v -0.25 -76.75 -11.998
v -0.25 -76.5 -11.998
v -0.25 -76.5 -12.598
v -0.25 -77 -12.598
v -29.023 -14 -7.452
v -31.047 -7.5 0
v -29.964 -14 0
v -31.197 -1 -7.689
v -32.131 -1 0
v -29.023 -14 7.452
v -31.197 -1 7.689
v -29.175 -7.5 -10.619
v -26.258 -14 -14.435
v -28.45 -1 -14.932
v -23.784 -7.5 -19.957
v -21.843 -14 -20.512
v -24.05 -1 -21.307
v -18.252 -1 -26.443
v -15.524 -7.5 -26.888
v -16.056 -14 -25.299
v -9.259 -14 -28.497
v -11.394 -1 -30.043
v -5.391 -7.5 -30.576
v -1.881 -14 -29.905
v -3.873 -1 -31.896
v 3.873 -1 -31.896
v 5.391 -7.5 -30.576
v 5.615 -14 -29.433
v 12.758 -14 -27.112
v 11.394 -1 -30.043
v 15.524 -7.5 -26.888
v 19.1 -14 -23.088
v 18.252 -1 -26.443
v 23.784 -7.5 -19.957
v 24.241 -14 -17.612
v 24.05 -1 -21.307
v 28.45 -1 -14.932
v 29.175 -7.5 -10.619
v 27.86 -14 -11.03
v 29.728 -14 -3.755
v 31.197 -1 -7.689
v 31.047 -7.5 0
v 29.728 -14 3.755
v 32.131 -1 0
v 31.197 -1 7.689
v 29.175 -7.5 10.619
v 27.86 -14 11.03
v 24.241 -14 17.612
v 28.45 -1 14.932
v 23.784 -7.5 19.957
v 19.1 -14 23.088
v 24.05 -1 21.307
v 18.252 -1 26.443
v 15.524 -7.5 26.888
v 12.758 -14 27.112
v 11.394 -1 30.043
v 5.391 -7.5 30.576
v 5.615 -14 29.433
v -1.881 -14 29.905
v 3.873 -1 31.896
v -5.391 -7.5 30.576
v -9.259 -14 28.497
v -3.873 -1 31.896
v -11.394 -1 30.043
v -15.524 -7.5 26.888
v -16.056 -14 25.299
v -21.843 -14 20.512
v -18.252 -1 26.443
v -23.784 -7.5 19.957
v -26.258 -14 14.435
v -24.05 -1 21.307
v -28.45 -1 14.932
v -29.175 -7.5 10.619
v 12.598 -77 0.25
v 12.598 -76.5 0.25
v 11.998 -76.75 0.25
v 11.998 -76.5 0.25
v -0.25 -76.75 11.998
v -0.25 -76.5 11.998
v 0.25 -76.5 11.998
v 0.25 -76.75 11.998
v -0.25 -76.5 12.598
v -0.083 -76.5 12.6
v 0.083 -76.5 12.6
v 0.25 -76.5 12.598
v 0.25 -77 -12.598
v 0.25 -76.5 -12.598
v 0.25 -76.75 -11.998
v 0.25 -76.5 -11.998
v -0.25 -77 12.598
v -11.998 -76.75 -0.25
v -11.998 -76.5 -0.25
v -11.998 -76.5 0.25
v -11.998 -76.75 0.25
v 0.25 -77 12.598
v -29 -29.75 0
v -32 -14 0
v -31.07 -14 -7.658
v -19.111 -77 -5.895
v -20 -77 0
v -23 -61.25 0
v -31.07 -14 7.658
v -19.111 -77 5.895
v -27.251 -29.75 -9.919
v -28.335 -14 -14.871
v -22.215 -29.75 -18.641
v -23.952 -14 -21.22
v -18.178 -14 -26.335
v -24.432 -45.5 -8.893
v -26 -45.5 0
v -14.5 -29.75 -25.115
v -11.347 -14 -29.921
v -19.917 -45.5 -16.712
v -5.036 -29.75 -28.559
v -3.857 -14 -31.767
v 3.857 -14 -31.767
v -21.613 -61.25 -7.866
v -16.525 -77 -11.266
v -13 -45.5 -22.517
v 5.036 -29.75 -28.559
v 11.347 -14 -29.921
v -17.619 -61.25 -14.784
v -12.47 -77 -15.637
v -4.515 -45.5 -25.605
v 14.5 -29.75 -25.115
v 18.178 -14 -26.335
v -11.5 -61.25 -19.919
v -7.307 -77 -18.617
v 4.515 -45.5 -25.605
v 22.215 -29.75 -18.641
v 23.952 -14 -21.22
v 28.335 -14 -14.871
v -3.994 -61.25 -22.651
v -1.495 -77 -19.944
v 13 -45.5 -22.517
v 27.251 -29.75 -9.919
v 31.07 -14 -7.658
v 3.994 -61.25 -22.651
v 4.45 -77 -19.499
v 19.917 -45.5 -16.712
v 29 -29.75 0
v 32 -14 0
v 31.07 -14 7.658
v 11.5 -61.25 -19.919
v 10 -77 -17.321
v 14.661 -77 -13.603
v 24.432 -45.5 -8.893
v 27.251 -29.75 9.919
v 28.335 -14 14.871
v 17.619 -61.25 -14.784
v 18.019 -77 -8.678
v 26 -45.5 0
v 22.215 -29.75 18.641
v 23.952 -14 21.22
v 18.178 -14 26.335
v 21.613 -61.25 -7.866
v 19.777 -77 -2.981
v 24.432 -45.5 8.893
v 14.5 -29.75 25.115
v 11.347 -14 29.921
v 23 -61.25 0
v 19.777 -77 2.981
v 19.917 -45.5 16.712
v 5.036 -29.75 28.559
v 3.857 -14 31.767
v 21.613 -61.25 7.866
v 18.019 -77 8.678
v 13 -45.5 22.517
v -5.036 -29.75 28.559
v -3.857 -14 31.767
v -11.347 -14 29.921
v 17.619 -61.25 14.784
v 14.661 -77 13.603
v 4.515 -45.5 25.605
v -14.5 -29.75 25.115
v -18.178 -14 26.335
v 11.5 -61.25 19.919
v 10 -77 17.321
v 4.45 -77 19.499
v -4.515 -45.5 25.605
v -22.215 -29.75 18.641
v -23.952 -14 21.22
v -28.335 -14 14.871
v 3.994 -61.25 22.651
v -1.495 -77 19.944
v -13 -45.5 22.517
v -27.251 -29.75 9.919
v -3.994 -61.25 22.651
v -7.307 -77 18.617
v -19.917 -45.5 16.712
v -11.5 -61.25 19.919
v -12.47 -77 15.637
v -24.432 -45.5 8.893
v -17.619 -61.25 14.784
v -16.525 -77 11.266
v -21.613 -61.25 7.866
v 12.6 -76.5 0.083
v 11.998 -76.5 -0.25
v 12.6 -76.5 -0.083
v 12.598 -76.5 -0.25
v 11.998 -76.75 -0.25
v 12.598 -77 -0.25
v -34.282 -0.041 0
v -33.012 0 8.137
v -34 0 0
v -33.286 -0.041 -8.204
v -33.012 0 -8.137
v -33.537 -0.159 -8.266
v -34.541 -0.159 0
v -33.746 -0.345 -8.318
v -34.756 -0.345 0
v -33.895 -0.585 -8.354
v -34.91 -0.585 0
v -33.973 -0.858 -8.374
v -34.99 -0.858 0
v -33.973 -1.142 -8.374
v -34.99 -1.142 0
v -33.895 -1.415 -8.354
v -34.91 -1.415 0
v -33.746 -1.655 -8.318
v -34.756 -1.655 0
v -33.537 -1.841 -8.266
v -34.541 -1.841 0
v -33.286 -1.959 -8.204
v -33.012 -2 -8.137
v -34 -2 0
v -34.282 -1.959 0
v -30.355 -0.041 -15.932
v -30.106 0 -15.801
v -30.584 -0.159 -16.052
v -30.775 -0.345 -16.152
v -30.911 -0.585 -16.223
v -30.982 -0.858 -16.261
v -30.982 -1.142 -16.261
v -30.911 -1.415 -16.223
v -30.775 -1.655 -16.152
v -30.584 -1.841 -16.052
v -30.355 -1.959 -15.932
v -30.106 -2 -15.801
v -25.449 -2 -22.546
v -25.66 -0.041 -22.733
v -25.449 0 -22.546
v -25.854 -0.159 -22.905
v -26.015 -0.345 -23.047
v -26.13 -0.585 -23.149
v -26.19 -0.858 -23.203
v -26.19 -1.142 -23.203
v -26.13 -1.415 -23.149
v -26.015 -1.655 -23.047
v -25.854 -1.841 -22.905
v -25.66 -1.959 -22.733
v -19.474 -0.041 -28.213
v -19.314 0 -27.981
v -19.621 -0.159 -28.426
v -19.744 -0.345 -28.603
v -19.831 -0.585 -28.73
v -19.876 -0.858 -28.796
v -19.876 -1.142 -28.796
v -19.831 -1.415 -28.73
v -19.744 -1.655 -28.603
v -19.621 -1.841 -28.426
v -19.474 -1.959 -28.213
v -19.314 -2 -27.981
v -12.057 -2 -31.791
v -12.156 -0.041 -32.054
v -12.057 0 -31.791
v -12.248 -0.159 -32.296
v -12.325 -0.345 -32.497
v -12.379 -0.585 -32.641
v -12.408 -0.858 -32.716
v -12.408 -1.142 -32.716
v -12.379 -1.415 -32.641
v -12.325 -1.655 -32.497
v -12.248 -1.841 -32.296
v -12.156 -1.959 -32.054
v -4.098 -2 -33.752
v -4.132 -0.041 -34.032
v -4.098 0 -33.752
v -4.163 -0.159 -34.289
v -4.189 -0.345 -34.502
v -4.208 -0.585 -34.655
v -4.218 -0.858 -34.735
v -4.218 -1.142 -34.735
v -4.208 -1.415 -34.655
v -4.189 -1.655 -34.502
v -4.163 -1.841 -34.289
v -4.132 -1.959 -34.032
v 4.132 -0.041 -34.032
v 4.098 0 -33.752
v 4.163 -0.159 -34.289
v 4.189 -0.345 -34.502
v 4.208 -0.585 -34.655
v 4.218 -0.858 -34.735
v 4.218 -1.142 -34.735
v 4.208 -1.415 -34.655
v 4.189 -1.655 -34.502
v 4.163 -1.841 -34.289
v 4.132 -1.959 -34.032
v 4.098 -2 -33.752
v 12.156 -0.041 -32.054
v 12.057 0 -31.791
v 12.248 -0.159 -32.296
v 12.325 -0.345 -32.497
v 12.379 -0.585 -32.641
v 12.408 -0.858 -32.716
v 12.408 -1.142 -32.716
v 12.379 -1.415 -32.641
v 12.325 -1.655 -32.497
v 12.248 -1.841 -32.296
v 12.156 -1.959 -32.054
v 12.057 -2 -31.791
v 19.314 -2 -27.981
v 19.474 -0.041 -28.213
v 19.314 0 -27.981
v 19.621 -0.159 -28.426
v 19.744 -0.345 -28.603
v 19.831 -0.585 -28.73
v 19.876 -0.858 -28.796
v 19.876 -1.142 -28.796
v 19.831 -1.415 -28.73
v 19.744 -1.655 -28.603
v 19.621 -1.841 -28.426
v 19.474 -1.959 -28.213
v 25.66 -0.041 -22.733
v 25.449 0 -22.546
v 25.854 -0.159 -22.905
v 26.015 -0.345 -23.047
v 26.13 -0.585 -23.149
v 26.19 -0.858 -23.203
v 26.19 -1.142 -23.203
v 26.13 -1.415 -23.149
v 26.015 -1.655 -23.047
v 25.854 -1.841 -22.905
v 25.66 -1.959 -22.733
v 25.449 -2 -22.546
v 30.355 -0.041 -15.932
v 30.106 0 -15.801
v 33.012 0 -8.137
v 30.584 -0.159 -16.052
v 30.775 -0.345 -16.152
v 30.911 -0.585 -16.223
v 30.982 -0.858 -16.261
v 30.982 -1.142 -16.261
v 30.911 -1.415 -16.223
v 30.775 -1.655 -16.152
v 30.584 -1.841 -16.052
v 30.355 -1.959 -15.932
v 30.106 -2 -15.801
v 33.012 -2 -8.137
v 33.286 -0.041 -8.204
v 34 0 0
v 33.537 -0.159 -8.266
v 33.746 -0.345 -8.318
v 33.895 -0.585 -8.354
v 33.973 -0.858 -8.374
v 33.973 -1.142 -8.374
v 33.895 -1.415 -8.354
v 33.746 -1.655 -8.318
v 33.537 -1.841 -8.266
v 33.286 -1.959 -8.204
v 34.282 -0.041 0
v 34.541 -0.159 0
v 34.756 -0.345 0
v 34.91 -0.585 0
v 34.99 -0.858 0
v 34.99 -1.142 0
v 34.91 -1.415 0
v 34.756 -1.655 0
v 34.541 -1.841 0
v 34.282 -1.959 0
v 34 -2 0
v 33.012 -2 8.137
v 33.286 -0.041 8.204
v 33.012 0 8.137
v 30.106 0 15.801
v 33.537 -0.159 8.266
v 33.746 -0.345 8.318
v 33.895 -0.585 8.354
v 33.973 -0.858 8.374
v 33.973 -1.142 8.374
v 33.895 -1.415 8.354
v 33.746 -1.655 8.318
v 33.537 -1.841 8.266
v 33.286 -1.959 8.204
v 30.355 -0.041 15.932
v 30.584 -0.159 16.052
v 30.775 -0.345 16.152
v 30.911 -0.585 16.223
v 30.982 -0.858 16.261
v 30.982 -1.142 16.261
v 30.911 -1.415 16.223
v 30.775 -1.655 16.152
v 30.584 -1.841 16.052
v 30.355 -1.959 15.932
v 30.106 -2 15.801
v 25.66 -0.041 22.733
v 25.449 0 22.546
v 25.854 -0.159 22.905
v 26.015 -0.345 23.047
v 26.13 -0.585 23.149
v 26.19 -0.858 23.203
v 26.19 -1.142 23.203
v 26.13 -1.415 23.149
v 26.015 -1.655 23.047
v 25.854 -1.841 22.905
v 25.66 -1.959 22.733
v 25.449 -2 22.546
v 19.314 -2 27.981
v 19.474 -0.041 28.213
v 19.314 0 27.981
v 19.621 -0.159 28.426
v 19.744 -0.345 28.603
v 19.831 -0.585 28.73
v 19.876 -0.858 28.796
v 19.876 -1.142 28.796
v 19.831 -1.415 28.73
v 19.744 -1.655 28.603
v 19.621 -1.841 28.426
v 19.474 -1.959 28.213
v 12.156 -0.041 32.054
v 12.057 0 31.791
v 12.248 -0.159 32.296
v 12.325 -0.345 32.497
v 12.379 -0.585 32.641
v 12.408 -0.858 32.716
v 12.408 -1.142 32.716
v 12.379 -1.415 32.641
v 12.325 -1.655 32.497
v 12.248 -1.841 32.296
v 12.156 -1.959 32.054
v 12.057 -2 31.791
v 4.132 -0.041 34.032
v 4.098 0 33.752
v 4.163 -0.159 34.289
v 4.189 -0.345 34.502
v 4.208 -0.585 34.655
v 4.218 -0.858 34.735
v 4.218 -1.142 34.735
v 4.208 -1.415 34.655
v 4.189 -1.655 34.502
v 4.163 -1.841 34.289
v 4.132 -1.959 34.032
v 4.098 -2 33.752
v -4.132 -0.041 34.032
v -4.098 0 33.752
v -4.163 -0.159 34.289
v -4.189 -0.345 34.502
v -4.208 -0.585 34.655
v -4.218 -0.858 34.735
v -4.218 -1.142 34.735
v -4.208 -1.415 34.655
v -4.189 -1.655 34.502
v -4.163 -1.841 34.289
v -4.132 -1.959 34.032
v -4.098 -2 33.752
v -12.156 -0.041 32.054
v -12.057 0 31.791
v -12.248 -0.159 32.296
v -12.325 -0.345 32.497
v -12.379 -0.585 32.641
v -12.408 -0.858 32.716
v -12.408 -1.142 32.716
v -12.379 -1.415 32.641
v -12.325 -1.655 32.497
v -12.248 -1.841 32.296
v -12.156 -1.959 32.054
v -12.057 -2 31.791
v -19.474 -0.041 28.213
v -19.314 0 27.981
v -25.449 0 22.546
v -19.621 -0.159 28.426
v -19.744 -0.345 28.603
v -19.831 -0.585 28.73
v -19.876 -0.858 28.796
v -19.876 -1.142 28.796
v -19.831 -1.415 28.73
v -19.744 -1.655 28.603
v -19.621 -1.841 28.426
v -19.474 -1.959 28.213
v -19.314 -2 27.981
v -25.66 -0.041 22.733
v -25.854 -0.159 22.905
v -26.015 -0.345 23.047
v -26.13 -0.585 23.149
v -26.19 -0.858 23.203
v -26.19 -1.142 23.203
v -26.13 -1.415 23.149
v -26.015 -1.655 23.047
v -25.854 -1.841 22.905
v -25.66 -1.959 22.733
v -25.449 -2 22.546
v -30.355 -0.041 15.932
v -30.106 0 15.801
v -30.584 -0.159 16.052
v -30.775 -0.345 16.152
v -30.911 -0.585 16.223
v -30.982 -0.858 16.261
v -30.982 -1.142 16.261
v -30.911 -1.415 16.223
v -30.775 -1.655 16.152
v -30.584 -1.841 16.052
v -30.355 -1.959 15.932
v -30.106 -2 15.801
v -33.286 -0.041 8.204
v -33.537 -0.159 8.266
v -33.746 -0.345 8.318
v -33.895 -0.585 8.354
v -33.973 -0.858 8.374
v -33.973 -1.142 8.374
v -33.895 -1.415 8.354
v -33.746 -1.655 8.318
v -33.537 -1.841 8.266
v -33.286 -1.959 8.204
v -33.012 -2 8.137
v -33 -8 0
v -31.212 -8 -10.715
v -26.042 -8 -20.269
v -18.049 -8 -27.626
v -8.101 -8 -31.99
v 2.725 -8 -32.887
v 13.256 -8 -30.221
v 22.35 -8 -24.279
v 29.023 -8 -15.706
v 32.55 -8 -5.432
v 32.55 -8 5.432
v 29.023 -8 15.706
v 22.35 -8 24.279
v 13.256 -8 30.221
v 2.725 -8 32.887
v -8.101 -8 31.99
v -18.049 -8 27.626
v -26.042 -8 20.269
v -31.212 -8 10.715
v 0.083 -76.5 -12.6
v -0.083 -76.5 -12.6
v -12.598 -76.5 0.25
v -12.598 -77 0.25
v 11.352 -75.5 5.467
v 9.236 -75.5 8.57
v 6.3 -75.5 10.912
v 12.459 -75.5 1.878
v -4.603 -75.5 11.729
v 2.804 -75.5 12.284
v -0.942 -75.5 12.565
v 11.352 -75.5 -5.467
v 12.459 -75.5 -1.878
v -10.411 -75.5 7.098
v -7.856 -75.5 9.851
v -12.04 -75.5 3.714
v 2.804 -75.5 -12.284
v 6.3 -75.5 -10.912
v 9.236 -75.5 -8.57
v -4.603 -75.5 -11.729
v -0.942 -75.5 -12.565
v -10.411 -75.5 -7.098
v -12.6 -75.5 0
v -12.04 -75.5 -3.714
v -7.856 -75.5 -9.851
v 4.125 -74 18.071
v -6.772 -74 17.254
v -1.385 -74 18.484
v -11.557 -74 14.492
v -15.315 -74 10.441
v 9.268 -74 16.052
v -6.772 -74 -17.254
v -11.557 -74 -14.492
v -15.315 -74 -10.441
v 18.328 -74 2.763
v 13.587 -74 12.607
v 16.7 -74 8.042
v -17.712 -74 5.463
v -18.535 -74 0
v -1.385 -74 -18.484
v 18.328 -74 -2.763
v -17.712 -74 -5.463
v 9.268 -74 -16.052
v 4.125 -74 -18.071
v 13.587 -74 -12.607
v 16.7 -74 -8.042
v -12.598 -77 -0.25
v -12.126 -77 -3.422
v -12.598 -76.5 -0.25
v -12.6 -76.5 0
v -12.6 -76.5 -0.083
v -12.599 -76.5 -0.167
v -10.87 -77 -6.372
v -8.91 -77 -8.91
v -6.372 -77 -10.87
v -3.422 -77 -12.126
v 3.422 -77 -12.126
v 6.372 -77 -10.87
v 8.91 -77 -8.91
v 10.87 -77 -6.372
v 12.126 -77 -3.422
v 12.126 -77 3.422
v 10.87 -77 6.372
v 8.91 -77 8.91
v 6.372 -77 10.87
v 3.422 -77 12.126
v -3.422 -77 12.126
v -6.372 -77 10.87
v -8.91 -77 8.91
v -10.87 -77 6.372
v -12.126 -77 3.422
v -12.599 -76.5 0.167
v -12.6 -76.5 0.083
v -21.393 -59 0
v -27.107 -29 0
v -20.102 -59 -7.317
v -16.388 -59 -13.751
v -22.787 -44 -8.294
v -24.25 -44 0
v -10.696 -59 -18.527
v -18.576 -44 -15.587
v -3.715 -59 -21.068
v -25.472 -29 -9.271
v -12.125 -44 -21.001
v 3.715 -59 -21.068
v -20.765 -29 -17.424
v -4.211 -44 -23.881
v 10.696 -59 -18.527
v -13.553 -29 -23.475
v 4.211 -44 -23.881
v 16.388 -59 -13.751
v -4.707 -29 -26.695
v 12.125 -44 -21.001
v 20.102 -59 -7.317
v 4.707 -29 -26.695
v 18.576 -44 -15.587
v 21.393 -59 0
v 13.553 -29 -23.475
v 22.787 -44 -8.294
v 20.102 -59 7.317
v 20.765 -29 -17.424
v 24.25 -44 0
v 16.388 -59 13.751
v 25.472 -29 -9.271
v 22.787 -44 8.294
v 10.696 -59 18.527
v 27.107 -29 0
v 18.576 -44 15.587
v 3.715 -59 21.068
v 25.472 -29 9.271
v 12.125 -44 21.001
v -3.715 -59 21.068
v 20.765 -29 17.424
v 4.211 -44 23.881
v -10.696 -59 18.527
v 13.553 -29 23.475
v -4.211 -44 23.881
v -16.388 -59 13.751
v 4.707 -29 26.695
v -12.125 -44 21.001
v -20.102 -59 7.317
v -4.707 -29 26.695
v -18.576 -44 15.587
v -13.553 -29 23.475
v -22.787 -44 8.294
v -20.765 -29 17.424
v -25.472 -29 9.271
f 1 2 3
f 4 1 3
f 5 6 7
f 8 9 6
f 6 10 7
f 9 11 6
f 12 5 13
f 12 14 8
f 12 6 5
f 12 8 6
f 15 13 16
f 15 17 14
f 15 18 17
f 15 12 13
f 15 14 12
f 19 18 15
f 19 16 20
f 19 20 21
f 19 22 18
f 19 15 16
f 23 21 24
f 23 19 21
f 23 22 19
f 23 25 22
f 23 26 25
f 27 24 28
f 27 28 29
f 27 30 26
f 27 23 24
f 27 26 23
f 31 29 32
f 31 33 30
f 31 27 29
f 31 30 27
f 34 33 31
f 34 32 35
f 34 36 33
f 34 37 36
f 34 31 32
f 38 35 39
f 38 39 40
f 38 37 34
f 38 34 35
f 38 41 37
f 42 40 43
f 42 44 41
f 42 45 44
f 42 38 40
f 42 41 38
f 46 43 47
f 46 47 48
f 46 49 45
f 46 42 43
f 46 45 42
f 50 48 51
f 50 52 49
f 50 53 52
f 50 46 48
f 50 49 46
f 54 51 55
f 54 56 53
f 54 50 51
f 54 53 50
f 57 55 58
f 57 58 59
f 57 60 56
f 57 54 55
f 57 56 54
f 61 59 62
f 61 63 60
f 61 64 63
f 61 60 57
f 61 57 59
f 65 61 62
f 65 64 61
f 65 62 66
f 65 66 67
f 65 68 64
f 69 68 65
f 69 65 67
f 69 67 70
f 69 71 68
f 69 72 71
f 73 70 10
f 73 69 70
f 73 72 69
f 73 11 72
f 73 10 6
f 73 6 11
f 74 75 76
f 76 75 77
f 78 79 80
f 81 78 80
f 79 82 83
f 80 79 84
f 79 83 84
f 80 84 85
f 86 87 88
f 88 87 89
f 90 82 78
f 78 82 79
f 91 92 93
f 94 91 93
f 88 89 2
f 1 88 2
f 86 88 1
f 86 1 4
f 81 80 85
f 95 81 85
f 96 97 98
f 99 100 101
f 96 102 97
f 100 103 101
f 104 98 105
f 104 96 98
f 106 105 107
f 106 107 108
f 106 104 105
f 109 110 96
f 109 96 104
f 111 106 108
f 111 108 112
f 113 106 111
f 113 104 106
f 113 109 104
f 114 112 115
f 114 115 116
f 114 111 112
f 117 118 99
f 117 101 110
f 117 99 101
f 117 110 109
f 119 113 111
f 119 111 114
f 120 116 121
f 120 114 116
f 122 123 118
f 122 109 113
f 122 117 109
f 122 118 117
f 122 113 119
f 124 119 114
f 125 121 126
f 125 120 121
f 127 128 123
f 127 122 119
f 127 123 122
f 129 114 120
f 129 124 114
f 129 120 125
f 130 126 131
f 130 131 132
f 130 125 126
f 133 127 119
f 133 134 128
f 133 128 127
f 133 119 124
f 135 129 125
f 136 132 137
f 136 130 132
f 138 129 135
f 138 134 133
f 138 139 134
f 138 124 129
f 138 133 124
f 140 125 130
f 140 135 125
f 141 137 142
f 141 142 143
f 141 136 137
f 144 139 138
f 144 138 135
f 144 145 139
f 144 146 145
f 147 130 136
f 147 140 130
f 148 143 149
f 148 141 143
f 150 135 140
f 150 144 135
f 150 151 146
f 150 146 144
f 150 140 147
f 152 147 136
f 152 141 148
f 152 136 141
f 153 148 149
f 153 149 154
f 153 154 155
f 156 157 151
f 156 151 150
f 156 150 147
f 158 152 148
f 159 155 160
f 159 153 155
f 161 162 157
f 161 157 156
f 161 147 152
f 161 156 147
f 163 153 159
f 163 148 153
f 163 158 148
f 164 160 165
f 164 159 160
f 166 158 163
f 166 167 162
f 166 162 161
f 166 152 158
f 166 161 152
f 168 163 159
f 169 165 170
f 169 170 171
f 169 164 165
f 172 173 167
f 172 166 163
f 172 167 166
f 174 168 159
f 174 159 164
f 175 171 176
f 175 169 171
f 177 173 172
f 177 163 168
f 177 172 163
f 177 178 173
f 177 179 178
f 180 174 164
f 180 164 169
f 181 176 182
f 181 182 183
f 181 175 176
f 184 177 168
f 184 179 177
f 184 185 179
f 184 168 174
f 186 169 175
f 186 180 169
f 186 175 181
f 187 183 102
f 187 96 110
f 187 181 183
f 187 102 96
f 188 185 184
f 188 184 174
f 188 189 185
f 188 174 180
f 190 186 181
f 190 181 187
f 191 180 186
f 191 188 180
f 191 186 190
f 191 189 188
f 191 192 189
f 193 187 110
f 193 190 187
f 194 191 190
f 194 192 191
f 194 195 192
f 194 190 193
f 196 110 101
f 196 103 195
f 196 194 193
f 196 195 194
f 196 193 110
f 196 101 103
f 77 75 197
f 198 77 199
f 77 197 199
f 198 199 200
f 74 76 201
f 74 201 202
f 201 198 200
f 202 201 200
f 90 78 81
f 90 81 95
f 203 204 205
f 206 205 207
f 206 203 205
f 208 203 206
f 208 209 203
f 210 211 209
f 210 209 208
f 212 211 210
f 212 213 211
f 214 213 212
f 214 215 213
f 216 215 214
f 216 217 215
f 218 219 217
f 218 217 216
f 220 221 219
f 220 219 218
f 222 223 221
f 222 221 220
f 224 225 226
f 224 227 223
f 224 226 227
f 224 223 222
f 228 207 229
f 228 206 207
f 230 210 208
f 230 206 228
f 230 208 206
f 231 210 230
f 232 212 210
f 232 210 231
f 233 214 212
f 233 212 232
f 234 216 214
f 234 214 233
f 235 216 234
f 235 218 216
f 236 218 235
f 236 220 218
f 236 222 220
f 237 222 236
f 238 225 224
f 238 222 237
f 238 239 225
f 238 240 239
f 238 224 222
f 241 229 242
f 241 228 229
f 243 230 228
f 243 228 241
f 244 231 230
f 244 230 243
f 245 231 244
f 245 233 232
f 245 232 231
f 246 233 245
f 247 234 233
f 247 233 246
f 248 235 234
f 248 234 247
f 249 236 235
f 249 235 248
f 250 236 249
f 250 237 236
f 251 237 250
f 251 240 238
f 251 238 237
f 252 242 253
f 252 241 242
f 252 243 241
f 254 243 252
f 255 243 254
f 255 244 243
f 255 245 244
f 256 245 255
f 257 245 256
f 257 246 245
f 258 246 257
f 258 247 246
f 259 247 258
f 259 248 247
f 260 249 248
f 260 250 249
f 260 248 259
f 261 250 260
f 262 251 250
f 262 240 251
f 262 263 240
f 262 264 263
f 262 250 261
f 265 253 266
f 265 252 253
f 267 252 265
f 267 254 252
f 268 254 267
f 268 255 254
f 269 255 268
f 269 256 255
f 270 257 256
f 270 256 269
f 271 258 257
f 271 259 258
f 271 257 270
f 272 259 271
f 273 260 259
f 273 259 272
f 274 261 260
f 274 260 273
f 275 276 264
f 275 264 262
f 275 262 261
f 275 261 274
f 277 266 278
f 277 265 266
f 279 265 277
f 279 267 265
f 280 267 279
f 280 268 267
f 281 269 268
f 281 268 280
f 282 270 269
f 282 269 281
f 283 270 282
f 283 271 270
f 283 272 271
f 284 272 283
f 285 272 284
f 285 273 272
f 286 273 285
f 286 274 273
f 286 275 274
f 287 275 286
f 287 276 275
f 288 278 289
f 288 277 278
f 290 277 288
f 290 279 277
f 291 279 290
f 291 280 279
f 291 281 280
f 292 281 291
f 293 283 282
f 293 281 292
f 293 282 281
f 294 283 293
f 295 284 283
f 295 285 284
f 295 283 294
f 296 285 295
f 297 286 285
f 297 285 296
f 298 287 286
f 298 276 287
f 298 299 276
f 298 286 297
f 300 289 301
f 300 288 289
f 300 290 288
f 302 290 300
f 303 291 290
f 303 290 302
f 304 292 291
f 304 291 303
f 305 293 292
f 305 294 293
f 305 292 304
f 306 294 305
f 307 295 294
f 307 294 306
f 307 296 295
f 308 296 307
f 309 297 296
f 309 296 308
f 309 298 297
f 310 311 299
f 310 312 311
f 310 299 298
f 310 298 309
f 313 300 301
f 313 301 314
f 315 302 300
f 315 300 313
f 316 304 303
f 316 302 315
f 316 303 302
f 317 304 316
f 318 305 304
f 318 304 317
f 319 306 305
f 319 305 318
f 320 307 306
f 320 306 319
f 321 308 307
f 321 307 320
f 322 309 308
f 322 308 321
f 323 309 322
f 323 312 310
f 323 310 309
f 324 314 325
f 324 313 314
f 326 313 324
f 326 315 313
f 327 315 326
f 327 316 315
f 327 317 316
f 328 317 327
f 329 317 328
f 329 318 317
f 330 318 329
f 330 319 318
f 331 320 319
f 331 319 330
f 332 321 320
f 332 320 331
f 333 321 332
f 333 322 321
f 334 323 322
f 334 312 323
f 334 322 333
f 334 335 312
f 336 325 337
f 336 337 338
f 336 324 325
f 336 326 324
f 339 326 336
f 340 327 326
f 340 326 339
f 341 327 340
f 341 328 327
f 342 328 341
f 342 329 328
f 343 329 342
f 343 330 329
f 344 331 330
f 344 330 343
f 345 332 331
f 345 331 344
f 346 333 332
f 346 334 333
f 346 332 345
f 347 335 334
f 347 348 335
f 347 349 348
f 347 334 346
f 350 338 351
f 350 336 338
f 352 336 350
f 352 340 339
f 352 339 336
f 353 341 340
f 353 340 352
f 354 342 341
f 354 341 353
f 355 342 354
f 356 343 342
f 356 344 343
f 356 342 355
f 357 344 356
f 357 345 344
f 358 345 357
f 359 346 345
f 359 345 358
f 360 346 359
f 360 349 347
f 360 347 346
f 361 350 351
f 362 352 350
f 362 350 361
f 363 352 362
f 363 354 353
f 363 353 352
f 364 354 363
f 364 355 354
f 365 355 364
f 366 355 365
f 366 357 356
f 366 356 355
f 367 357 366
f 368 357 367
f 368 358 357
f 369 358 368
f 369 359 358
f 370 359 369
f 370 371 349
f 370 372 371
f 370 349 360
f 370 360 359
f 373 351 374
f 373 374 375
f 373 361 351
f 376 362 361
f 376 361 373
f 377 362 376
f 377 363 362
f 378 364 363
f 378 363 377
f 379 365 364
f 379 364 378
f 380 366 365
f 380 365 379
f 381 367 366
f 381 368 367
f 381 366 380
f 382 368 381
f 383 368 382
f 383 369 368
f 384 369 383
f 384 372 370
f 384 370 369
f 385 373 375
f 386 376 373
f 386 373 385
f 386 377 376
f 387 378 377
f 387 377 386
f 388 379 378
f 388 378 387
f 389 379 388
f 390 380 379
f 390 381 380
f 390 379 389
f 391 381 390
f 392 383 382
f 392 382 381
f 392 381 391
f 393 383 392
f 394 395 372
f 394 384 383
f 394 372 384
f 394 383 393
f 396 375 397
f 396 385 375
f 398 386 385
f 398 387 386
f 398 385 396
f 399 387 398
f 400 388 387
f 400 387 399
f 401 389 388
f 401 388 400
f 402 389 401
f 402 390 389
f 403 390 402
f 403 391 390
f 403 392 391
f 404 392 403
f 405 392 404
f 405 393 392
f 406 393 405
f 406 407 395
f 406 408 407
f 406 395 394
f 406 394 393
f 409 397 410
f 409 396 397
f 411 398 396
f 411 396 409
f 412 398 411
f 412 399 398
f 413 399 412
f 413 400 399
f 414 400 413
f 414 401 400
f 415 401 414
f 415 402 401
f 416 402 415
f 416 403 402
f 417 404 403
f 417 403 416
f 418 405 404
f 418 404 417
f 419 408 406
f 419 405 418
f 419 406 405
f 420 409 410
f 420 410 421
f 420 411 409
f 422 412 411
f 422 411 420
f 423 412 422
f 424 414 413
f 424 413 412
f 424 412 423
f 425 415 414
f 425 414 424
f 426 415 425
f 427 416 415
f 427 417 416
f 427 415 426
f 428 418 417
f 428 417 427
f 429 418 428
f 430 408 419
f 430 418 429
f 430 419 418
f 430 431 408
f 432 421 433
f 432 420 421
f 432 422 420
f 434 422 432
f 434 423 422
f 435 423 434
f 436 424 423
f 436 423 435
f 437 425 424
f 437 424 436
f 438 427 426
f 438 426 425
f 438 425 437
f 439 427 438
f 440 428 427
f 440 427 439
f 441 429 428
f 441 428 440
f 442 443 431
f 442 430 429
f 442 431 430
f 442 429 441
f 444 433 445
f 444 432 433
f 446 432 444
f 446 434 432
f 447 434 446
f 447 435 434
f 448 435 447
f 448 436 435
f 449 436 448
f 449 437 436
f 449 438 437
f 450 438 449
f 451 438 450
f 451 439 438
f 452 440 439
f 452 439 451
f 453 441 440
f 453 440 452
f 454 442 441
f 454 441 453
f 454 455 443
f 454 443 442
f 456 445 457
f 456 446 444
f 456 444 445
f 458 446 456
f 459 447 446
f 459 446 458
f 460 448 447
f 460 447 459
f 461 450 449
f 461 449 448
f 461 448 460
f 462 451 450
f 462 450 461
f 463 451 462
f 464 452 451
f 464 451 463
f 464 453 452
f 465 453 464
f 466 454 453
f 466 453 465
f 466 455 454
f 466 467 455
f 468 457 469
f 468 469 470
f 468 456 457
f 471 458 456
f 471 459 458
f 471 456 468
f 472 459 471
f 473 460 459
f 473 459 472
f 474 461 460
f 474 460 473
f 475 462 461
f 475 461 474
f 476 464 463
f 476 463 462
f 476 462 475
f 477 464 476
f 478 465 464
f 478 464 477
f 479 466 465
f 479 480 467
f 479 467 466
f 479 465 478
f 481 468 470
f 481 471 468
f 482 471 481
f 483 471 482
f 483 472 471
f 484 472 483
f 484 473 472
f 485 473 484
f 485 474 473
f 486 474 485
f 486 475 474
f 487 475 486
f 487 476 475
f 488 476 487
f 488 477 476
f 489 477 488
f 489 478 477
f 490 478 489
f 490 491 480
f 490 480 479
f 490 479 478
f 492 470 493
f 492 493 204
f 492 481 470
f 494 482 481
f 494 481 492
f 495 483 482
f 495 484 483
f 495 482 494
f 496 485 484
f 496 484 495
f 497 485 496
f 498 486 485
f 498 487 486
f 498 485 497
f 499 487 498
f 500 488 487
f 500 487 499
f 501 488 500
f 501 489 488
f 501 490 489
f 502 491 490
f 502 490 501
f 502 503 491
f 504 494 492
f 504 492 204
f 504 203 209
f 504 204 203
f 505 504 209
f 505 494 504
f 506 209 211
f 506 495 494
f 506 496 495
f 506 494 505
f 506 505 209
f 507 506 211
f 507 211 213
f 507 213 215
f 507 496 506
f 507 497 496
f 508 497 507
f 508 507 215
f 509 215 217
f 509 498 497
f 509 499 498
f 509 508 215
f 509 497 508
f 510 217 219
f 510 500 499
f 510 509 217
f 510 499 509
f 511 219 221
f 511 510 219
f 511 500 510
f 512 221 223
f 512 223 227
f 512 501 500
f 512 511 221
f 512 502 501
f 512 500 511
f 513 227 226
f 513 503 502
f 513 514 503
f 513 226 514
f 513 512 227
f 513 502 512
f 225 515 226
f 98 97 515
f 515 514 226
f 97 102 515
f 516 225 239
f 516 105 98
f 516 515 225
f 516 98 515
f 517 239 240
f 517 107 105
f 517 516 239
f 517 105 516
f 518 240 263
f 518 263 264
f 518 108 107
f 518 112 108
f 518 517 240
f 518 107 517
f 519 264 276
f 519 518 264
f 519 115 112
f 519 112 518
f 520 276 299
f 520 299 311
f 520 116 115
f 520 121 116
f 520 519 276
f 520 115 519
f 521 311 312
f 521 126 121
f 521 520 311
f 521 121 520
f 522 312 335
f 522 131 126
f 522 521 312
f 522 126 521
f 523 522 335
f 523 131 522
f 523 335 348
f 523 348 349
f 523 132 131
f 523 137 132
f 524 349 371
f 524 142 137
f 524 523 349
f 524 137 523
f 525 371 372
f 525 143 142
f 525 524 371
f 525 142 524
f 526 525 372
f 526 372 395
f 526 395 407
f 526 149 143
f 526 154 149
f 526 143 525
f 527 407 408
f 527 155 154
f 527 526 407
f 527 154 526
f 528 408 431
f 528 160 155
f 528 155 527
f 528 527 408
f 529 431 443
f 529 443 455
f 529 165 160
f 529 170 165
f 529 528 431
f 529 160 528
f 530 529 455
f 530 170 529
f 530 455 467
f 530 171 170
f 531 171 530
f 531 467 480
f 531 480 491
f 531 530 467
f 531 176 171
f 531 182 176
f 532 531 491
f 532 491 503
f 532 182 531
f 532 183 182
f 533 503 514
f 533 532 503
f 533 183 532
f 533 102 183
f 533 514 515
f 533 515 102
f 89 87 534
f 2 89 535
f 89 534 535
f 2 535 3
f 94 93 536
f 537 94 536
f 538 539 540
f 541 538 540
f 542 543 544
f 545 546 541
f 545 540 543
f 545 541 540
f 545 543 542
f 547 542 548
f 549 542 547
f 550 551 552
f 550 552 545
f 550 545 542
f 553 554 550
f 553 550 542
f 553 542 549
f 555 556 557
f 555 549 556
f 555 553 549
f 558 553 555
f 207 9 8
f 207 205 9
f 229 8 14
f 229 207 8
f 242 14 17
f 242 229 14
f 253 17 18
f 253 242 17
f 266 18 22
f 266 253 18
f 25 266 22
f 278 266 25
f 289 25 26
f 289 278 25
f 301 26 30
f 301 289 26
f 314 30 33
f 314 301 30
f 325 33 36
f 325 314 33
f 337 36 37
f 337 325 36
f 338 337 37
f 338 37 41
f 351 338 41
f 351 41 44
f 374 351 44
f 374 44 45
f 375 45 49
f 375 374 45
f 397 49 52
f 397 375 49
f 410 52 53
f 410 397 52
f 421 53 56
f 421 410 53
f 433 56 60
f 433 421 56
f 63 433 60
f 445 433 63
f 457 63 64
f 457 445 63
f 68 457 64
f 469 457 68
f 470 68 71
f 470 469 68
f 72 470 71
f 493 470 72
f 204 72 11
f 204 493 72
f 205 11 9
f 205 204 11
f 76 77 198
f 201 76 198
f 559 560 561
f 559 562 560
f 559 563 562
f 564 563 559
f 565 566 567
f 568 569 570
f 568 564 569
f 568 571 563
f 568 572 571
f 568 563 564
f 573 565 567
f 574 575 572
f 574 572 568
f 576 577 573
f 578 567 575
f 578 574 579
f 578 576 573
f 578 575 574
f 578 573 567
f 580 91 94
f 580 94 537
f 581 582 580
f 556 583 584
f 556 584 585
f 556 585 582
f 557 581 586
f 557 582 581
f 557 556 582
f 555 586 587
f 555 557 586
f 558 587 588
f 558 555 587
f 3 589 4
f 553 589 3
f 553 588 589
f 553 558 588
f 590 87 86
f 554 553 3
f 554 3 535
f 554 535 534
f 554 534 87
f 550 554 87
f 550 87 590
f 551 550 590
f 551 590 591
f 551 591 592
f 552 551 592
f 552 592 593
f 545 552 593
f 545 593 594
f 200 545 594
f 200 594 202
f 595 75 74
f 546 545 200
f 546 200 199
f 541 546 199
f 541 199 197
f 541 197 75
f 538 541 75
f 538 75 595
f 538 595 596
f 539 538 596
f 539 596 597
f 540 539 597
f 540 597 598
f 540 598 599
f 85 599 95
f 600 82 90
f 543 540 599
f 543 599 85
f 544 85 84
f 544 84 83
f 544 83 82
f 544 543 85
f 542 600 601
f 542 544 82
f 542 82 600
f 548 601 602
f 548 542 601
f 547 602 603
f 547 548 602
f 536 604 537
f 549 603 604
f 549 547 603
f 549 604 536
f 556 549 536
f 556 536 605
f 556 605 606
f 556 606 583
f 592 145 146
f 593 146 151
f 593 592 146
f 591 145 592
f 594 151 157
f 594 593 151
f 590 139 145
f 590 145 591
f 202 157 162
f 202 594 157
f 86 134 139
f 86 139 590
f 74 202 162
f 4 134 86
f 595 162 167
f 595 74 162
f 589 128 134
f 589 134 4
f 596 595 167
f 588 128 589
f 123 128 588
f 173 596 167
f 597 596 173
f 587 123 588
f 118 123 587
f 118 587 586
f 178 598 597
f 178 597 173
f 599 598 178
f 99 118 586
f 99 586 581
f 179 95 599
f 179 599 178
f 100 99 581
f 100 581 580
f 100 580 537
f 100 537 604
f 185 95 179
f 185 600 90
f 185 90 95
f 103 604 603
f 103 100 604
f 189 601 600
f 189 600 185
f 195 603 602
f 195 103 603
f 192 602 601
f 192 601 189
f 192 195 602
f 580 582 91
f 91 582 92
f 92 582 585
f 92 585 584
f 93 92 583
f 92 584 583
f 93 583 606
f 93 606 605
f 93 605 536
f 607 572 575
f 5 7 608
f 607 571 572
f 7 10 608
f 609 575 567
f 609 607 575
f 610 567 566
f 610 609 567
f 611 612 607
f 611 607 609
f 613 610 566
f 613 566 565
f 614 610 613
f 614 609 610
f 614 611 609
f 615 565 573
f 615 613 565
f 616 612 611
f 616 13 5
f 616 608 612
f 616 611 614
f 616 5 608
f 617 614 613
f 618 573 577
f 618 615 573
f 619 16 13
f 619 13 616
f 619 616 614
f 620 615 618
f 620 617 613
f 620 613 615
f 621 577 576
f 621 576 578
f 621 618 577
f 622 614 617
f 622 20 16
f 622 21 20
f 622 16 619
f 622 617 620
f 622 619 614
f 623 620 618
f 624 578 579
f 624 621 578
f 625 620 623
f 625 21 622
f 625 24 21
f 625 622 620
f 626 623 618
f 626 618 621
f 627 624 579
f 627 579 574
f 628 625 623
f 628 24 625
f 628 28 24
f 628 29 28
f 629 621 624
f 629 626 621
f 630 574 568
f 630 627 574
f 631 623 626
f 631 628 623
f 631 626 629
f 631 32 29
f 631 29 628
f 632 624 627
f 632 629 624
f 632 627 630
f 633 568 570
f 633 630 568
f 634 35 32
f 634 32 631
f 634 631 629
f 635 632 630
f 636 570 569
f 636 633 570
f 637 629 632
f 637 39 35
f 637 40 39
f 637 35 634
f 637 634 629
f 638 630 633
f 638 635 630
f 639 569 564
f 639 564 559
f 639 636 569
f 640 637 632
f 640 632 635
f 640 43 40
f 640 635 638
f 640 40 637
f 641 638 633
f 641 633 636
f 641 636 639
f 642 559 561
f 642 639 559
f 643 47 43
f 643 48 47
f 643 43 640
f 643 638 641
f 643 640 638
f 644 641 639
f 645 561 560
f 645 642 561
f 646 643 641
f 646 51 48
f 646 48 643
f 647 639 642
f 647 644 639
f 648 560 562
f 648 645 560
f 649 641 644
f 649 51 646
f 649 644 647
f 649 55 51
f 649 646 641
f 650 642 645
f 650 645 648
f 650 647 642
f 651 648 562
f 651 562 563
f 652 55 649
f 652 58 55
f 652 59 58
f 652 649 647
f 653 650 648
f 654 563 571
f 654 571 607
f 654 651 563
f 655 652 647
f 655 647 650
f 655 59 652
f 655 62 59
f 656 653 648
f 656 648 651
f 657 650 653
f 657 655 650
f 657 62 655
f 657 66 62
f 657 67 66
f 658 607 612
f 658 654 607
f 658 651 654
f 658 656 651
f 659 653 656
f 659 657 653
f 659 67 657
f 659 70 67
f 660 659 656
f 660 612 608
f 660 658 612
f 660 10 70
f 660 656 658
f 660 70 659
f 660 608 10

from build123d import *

# Parameters (mm, degrees)
BOSS_EXTRUDE1_START = -0.5
BOSS_EXTRUDE1_DEPTH = 0.5
CUT_EXTRUDE1_DEPTH  = 0.5
CIRPATTERN2_COUNT   = 4


with BuildPart() as part:
    # Sketch1 → Revolve1 (revolve)
    with BuildSketch(Plane.XY):
        with BuildLine():
            Line((-32.130708731, -1), (-34, 0))
            ThreePointArc((-34, 0), (-35, -1), (-34, -2))
            Line((-34, -2), (-32, -14))
            Line((-32, -14), (-20, -77))
            Line((-20, -77), (-12.6, -77))
            Line((-12.6, -77), (-12.6, -75.5))
            Line((-12.6, -75.5), (0, -75.5))
            Line((0, -75.5), (0, -74))
            Line((0, -74), (-18.535470636, -74))
            Line((-18.535470636, -74), (-29.964042064, -14))
            Line((-29.964042064, -14), (-32.130708731, -1))
        make_face()
    revolve(axis=Axis((0, 0, 0), (0, -1, 0)))

    # Sketch3 → Boss-Extrude1 (add)
    with BuildSketch(Plane.XZ.offset(77).offset(BOSS_EXTRUDE1_START)):
        with BuildLine():
            Line((-0.25, 12.597519597), (-0.25, 11.997519597))
            Line((-0.25, 11.997519597), (0.25, 11.997519597))
            Line((0.25, 11.997519597), (0.25, 12.597519597))
            ThreePointArc((0.25, 12.597519597), (0, 12.6), (-0.25, 12.597519597))
        make_face()
    boss_extrude1 = extrude(amount=BOSS_EXTRUDE1_DEPTH)

    # Sketch8 → Cut-Extrude1 (cut)
    with BuildSketch(Plane.ZY.offset(0.25)):
        Polygon((11.997519597, -76.75), (12.597519597, -77), (11.997519597, -77), align=None)
    cut_extrude1 = extrude(amount=-CUT_EXTRUDE1_DEPTH, mode=Mode.SUBTRACT)

    # CirPattern2: Boss-Extrude1, Cut-Extrude1 ×4 about axis
    cirpattern2_axis = Axis((0, 0, 0), (0, 1, 0))
    add([boss_extrude1.rotate(cirpattern2_axis, i * 360 / CIRPATTERN2_COUNT) for i in range(1, CIRPATTERN2_COUNT)])
    add([cut_extrude1.rotate(cirpattern2_axis, i * 360 / CIRPATTERN2_COUNT) for i in range(1, CIRPATTERN2_COUNT)], mode=Mode.SUBTRACT)


solid = part.part
